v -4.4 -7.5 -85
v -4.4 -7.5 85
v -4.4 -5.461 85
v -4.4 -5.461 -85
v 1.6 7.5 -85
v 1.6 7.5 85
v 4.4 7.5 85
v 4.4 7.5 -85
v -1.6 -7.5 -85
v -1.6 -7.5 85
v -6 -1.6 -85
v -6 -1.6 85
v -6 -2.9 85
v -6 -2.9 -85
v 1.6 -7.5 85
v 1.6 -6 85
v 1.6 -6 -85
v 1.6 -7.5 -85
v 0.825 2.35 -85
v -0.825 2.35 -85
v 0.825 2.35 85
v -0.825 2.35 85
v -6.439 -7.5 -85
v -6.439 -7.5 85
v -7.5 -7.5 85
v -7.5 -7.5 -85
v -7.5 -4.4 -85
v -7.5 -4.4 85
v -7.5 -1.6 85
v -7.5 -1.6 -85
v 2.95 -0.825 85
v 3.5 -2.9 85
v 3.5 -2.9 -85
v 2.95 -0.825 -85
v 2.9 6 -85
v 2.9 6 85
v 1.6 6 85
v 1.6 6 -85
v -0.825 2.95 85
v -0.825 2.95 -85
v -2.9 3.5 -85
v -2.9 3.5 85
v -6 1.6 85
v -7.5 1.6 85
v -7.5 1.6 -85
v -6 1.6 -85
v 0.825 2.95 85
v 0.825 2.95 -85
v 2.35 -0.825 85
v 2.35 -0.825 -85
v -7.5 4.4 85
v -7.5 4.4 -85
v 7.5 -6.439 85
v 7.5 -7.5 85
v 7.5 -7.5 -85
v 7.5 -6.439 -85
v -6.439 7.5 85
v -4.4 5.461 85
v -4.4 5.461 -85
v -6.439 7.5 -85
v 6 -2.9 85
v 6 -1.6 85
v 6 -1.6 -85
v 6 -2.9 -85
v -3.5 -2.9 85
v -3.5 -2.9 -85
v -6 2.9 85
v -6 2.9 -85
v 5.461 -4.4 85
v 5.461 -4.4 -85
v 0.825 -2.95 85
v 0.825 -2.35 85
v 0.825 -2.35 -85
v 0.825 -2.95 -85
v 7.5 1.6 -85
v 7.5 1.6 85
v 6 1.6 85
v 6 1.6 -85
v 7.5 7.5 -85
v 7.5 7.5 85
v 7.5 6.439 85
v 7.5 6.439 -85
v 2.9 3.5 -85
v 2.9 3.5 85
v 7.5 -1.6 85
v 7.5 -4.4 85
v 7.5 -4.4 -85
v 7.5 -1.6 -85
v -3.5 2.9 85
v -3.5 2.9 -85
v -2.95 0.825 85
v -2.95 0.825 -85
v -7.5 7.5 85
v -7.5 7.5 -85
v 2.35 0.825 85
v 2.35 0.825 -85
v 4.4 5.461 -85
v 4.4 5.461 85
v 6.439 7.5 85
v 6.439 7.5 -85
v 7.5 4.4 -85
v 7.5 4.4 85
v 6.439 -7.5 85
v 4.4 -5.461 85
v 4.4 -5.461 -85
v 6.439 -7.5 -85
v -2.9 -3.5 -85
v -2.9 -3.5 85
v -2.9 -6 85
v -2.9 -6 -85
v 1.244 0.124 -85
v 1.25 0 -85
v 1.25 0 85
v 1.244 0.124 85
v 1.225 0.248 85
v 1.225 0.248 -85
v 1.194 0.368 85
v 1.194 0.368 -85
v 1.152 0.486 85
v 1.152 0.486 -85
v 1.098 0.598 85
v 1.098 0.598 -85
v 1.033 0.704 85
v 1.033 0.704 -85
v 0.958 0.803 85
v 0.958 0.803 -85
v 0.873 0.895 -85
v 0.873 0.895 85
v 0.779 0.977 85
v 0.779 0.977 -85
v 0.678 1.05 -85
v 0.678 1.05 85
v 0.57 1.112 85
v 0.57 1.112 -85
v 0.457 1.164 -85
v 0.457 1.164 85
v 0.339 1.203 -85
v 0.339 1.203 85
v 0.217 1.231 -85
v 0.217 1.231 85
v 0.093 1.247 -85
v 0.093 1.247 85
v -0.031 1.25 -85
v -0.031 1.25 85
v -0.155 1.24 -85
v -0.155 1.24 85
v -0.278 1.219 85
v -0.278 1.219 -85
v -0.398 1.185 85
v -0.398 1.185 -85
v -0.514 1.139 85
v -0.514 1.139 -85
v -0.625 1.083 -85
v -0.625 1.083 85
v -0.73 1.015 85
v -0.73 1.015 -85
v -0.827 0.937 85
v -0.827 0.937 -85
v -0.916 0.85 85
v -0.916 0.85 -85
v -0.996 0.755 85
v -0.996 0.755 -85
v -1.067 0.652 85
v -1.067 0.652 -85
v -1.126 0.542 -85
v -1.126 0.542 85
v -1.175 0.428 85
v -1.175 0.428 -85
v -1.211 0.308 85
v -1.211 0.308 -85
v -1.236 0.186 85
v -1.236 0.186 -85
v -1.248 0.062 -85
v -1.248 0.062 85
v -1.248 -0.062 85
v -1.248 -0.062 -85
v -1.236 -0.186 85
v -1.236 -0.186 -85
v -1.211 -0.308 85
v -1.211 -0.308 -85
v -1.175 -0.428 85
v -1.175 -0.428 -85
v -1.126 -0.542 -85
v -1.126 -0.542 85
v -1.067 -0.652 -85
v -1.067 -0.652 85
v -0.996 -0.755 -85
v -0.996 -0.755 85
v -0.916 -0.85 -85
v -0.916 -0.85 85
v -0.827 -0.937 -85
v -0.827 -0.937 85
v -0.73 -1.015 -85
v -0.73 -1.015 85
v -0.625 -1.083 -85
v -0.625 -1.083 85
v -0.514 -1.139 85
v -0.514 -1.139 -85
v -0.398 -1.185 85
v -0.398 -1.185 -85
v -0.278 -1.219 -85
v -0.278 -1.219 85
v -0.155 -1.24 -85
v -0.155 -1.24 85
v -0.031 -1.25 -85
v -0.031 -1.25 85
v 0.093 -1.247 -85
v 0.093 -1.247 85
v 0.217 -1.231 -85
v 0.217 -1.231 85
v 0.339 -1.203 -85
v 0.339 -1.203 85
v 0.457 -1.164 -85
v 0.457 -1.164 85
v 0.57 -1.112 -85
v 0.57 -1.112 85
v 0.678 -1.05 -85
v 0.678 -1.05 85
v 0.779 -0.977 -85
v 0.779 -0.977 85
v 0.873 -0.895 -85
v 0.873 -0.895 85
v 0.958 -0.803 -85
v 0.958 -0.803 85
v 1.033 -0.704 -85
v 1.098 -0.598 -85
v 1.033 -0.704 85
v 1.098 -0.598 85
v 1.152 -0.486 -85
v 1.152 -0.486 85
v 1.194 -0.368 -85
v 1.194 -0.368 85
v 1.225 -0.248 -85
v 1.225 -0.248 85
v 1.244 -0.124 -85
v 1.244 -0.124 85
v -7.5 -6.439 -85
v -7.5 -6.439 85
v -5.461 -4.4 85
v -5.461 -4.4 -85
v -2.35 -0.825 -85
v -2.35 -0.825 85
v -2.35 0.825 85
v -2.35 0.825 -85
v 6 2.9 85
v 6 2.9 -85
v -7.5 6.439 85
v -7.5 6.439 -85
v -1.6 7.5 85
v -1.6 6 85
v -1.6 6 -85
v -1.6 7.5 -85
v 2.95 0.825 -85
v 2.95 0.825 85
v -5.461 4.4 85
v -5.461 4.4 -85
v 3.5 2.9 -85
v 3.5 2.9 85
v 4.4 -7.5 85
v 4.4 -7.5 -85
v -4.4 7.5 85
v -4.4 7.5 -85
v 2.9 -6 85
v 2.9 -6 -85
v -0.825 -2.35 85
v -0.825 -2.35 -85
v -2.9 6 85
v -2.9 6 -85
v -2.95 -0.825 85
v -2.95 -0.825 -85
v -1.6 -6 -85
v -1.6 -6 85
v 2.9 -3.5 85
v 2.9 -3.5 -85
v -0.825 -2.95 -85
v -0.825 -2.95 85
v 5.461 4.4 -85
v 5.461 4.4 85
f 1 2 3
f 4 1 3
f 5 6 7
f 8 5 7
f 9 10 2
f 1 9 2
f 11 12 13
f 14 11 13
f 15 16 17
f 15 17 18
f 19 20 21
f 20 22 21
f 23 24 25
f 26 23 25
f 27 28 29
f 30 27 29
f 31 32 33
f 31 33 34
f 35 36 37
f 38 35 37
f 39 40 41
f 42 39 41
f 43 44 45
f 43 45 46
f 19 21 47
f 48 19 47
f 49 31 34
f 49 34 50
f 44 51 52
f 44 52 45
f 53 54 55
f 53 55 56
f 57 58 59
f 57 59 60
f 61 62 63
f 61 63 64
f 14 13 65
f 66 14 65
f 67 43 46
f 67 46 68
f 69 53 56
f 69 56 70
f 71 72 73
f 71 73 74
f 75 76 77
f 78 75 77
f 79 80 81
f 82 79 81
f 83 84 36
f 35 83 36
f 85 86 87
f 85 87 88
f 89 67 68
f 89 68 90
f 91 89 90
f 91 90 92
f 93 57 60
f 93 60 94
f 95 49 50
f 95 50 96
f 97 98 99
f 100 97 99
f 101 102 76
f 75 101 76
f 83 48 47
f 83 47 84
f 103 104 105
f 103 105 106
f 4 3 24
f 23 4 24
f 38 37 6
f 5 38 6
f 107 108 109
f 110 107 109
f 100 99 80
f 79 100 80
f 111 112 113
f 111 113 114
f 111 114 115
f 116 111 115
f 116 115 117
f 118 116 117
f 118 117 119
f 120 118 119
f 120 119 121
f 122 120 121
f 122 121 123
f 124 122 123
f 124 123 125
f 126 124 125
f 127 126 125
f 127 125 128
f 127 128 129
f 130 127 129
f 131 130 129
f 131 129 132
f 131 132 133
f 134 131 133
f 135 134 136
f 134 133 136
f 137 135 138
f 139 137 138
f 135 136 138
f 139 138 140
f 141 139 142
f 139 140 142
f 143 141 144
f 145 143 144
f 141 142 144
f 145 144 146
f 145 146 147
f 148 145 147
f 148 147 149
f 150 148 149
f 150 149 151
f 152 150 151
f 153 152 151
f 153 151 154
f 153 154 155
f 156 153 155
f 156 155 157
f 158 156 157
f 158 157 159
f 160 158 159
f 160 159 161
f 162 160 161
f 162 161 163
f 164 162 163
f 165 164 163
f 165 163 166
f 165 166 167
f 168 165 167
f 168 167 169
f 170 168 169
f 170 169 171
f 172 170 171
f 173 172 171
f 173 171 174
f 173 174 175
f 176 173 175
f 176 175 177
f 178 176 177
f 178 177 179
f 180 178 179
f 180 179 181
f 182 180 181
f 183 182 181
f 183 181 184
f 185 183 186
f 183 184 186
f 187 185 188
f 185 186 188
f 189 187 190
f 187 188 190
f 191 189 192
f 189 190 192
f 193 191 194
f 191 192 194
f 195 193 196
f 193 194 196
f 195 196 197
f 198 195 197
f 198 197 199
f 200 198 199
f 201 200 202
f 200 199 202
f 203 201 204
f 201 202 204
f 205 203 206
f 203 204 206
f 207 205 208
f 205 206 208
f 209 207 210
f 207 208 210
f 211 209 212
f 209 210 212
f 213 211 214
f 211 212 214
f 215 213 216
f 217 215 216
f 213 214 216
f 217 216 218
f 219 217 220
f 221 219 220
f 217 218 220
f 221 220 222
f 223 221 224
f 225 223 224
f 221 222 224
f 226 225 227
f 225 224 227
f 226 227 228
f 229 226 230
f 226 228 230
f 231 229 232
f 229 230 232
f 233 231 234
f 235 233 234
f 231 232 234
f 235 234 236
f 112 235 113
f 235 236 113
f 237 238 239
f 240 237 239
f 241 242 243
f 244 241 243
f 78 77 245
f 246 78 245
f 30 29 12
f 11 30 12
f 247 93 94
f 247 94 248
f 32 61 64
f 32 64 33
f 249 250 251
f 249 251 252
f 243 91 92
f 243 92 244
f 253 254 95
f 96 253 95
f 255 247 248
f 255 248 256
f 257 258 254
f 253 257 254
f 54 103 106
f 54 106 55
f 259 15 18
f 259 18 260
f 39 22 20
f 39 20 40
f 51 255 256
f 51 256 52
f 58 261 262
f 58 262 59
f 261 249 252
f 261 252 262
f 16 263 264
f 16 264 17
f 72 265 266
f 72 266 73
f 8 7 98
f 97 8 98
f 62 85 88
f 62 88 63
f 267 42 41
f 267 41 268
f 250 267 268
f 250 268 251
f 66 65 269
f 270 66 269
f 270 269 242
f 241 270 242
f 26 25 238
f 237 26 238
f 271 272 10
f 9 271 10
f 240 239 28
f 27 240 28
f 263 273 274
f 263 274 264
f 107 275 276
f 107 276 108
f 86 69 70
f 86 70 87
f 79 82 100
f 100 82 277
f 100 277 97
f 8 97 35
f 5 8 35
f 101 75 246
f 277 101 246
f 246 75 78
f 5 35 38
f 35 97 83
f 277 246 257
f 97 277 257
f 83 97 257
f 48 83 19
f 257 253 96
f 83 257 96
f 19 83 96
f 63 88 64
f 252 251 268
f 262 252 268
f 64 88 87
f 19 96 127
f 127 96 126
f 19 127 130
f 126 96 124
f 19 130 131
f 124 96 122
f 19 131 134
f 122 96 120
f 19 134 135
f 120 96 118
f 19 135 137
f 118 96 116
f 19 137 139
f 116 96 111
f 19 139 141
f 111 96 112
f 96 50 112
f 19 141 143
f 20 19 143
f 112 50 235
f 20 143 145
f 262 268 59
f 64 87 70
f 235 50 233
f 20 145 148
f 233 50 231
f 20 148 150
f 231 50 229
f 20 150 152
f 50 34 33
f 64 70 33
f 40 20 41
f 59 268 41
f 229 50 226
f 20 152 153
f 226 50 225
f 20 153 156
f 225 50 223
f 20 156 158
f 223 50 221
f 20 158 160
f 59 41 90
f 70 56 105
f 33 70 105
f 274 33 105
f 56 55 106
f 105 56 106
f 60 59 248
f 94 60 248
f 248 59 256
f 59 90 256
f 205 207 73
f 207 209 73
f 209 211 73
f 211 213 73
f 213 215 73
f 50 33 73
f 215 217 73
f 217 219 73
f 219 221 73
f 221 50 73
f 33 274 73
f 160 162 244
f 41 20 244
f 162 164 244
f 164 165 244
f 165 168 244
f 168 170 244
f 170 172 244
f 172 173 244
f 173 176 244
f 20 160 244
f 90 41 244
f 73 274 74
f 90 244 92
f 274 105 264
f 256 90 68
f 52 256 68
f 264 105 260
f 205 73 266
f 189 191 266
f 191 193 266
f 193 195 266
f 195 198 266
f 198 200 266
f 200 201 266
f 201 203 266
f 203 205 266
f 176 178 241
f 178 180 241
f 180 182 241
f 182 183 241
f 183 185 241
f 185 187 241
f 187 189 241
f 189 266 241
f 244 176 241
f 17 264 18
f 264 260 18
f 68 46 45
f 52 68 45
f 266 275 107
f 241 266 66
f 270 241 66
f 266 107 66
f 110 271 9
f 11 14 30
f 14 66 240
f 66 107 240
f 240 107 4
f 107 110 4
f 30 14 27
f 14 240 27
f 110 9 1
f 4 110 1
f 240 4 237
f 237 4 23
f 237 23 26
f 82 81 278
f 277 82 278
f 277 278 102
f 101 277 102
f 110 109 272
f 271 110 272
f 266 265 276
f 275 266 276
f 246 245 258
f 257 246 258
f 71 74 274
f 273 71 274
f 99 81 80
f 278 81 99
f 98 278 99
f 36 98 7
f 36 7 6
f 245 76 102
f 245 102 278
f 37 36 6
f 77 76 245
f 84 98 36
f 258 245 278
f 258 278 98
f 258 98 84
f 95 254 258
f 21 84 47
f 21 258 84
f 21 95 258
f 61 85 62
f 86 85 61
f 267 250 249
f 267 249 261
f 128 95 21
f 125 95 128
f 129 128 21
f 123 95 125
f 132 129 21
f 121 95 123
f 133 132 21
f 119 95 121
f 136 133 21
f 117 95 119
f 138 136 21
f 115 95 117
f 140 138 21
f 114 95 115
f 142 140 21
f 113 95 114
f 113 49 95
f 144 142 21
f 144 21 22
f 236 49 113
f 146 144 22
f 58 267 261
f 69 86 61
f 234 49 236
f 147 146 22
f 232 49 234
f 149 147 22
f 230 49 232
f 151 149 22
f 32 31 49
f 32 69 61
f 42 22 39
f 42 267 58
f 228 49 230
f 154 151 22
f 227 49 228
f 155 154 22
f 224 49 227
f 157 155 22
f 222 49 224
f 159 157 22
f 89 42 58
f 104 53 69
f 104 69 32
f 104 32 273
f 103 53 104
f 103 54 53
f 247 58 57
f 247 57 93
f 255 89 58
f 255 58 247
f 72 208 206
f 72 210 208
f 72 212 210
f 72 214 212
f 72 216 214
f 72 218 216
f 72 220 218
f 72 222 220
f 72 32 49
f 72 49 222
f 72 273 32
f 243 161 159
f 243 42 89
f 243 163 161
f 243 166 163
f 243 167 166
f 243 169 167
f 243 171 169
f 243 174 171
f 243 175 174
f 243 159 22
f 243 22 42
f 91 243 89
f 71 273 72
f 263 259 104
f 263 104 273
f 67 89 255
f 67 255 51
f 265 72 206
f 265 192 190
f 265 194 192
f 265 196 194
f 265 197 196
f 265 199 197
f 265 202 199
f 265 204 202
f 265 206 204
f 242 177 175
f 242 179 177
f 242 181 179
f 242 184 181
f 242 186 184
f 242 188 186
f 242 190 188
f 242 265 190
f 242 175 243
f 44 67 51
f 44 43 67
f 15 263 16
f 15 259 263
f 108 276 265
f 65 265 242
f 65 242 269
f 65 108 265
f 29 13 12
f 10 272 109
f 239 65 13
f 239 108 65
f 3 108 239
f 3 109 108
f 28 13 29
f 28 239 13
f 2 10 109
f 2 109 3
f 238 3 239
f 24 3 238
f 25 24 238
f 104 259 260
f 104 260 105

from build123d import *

# Parameters (mm, degrees)
RESSALTO_EXTRUS_O1_DEPTH   = 85
ESPELHAR2_COPY_1_DEPTH     = 85
ESBO_O2_R                  = 1.25
CORTE_EXTRUS_O1_DEPTH      = 1
CORTE_EXTRUS_O1_DEPTH_BACK = 171


with BuildPart() as part:
    # Esboço1 → Ressalto-extrusão1 (new body, symmetric)
    with BuildSketch(Plane.XY):
        Polygon((0, 2.35), (-0.825, 2.35), (-0.825, 2.95), (-2.9, 3.5), (-2.9, 6), (-1.6, 6), (-1.6, 7.5), (-4.4, 7.5), (-4.4, 5.460660172), (-6.439339828, 7.5), (-7.5, 7.5), (-7.5, 6.439339828), (-5.460660172, 4.4), (-7.5, 4.4), (-7.5, 1.6), (-6, 1.6), (-6, 2.9), (-3.5, 2.9), (-2.95, 0.825), (-2.35, 0.825), (-2.35, 0), (0, 0), align=None)
    ressalto_extrus_o1 = extrude(amount=RESSALTO_EXTRUS_O1_DEPTH, both=True)

    # Espelhar1: Ressalto-extrusão1 across plane
    add(ressalto_extrus_o1.mirror(Plane.ZX))

    # Espelhar2: Ressalto-extrusão1 across plane
    add(ressalto_extrus_o1.mirror(Plane(origin=(0, 0, 0), x_dir=(0, 0, 1), z_dir=(1, 0, 0))))

    # Espelhar2 copy 1 sketch → Espelhar2 copy 1 (add, symmetric)
    with BuildSketch(Plane(origin=(0, 0, 0), x_dir=(-1, 0, 0), z_dir=(0, 0, 1))):
        Polygon((0, 2.35), (-0.825, 2.35), (-0.825, 2.95), (-2.9, 3.5), (-2.9, 6), (-1.6, 6), (-1.6, 7.5), (-4.4, 7.5), (-4.4, 5.460660172), (-6.439339828, 7.5), (-7.5, 7.5), (-7.5, 6.439339828), (-5.460660172, 4.4), (-7.5, 4.4), (-7.5, 1.6), (-6, 1.6), (-6, 2.9), (-3.5, 2.9), (-2.95, 0.825), (-2.35, 0.825), (-2.35, 0), (0, 0), align=None)
    extrude(amount=ESPELHAR2_COPY_1_DEPTH, both=True)

    # Esboço2 → Corte-extrusão1 (cut, two sides)
    with BuildSketch(Plane.XY.offset(85)) as corte_extrus_o1_sk:
        Circle(ESBO_O2_R)
    extrude(amount=CORTE_EXTRUS_O1_DEPTH, mode=Mode.SUBTRACT)
    extrude(corte_extrus_o1_sk.sketch, amount=-CORTE_EXTRUS_O1_DEPTH_BACK, mode=Mode.SUBTRACT)


solid = part.part
